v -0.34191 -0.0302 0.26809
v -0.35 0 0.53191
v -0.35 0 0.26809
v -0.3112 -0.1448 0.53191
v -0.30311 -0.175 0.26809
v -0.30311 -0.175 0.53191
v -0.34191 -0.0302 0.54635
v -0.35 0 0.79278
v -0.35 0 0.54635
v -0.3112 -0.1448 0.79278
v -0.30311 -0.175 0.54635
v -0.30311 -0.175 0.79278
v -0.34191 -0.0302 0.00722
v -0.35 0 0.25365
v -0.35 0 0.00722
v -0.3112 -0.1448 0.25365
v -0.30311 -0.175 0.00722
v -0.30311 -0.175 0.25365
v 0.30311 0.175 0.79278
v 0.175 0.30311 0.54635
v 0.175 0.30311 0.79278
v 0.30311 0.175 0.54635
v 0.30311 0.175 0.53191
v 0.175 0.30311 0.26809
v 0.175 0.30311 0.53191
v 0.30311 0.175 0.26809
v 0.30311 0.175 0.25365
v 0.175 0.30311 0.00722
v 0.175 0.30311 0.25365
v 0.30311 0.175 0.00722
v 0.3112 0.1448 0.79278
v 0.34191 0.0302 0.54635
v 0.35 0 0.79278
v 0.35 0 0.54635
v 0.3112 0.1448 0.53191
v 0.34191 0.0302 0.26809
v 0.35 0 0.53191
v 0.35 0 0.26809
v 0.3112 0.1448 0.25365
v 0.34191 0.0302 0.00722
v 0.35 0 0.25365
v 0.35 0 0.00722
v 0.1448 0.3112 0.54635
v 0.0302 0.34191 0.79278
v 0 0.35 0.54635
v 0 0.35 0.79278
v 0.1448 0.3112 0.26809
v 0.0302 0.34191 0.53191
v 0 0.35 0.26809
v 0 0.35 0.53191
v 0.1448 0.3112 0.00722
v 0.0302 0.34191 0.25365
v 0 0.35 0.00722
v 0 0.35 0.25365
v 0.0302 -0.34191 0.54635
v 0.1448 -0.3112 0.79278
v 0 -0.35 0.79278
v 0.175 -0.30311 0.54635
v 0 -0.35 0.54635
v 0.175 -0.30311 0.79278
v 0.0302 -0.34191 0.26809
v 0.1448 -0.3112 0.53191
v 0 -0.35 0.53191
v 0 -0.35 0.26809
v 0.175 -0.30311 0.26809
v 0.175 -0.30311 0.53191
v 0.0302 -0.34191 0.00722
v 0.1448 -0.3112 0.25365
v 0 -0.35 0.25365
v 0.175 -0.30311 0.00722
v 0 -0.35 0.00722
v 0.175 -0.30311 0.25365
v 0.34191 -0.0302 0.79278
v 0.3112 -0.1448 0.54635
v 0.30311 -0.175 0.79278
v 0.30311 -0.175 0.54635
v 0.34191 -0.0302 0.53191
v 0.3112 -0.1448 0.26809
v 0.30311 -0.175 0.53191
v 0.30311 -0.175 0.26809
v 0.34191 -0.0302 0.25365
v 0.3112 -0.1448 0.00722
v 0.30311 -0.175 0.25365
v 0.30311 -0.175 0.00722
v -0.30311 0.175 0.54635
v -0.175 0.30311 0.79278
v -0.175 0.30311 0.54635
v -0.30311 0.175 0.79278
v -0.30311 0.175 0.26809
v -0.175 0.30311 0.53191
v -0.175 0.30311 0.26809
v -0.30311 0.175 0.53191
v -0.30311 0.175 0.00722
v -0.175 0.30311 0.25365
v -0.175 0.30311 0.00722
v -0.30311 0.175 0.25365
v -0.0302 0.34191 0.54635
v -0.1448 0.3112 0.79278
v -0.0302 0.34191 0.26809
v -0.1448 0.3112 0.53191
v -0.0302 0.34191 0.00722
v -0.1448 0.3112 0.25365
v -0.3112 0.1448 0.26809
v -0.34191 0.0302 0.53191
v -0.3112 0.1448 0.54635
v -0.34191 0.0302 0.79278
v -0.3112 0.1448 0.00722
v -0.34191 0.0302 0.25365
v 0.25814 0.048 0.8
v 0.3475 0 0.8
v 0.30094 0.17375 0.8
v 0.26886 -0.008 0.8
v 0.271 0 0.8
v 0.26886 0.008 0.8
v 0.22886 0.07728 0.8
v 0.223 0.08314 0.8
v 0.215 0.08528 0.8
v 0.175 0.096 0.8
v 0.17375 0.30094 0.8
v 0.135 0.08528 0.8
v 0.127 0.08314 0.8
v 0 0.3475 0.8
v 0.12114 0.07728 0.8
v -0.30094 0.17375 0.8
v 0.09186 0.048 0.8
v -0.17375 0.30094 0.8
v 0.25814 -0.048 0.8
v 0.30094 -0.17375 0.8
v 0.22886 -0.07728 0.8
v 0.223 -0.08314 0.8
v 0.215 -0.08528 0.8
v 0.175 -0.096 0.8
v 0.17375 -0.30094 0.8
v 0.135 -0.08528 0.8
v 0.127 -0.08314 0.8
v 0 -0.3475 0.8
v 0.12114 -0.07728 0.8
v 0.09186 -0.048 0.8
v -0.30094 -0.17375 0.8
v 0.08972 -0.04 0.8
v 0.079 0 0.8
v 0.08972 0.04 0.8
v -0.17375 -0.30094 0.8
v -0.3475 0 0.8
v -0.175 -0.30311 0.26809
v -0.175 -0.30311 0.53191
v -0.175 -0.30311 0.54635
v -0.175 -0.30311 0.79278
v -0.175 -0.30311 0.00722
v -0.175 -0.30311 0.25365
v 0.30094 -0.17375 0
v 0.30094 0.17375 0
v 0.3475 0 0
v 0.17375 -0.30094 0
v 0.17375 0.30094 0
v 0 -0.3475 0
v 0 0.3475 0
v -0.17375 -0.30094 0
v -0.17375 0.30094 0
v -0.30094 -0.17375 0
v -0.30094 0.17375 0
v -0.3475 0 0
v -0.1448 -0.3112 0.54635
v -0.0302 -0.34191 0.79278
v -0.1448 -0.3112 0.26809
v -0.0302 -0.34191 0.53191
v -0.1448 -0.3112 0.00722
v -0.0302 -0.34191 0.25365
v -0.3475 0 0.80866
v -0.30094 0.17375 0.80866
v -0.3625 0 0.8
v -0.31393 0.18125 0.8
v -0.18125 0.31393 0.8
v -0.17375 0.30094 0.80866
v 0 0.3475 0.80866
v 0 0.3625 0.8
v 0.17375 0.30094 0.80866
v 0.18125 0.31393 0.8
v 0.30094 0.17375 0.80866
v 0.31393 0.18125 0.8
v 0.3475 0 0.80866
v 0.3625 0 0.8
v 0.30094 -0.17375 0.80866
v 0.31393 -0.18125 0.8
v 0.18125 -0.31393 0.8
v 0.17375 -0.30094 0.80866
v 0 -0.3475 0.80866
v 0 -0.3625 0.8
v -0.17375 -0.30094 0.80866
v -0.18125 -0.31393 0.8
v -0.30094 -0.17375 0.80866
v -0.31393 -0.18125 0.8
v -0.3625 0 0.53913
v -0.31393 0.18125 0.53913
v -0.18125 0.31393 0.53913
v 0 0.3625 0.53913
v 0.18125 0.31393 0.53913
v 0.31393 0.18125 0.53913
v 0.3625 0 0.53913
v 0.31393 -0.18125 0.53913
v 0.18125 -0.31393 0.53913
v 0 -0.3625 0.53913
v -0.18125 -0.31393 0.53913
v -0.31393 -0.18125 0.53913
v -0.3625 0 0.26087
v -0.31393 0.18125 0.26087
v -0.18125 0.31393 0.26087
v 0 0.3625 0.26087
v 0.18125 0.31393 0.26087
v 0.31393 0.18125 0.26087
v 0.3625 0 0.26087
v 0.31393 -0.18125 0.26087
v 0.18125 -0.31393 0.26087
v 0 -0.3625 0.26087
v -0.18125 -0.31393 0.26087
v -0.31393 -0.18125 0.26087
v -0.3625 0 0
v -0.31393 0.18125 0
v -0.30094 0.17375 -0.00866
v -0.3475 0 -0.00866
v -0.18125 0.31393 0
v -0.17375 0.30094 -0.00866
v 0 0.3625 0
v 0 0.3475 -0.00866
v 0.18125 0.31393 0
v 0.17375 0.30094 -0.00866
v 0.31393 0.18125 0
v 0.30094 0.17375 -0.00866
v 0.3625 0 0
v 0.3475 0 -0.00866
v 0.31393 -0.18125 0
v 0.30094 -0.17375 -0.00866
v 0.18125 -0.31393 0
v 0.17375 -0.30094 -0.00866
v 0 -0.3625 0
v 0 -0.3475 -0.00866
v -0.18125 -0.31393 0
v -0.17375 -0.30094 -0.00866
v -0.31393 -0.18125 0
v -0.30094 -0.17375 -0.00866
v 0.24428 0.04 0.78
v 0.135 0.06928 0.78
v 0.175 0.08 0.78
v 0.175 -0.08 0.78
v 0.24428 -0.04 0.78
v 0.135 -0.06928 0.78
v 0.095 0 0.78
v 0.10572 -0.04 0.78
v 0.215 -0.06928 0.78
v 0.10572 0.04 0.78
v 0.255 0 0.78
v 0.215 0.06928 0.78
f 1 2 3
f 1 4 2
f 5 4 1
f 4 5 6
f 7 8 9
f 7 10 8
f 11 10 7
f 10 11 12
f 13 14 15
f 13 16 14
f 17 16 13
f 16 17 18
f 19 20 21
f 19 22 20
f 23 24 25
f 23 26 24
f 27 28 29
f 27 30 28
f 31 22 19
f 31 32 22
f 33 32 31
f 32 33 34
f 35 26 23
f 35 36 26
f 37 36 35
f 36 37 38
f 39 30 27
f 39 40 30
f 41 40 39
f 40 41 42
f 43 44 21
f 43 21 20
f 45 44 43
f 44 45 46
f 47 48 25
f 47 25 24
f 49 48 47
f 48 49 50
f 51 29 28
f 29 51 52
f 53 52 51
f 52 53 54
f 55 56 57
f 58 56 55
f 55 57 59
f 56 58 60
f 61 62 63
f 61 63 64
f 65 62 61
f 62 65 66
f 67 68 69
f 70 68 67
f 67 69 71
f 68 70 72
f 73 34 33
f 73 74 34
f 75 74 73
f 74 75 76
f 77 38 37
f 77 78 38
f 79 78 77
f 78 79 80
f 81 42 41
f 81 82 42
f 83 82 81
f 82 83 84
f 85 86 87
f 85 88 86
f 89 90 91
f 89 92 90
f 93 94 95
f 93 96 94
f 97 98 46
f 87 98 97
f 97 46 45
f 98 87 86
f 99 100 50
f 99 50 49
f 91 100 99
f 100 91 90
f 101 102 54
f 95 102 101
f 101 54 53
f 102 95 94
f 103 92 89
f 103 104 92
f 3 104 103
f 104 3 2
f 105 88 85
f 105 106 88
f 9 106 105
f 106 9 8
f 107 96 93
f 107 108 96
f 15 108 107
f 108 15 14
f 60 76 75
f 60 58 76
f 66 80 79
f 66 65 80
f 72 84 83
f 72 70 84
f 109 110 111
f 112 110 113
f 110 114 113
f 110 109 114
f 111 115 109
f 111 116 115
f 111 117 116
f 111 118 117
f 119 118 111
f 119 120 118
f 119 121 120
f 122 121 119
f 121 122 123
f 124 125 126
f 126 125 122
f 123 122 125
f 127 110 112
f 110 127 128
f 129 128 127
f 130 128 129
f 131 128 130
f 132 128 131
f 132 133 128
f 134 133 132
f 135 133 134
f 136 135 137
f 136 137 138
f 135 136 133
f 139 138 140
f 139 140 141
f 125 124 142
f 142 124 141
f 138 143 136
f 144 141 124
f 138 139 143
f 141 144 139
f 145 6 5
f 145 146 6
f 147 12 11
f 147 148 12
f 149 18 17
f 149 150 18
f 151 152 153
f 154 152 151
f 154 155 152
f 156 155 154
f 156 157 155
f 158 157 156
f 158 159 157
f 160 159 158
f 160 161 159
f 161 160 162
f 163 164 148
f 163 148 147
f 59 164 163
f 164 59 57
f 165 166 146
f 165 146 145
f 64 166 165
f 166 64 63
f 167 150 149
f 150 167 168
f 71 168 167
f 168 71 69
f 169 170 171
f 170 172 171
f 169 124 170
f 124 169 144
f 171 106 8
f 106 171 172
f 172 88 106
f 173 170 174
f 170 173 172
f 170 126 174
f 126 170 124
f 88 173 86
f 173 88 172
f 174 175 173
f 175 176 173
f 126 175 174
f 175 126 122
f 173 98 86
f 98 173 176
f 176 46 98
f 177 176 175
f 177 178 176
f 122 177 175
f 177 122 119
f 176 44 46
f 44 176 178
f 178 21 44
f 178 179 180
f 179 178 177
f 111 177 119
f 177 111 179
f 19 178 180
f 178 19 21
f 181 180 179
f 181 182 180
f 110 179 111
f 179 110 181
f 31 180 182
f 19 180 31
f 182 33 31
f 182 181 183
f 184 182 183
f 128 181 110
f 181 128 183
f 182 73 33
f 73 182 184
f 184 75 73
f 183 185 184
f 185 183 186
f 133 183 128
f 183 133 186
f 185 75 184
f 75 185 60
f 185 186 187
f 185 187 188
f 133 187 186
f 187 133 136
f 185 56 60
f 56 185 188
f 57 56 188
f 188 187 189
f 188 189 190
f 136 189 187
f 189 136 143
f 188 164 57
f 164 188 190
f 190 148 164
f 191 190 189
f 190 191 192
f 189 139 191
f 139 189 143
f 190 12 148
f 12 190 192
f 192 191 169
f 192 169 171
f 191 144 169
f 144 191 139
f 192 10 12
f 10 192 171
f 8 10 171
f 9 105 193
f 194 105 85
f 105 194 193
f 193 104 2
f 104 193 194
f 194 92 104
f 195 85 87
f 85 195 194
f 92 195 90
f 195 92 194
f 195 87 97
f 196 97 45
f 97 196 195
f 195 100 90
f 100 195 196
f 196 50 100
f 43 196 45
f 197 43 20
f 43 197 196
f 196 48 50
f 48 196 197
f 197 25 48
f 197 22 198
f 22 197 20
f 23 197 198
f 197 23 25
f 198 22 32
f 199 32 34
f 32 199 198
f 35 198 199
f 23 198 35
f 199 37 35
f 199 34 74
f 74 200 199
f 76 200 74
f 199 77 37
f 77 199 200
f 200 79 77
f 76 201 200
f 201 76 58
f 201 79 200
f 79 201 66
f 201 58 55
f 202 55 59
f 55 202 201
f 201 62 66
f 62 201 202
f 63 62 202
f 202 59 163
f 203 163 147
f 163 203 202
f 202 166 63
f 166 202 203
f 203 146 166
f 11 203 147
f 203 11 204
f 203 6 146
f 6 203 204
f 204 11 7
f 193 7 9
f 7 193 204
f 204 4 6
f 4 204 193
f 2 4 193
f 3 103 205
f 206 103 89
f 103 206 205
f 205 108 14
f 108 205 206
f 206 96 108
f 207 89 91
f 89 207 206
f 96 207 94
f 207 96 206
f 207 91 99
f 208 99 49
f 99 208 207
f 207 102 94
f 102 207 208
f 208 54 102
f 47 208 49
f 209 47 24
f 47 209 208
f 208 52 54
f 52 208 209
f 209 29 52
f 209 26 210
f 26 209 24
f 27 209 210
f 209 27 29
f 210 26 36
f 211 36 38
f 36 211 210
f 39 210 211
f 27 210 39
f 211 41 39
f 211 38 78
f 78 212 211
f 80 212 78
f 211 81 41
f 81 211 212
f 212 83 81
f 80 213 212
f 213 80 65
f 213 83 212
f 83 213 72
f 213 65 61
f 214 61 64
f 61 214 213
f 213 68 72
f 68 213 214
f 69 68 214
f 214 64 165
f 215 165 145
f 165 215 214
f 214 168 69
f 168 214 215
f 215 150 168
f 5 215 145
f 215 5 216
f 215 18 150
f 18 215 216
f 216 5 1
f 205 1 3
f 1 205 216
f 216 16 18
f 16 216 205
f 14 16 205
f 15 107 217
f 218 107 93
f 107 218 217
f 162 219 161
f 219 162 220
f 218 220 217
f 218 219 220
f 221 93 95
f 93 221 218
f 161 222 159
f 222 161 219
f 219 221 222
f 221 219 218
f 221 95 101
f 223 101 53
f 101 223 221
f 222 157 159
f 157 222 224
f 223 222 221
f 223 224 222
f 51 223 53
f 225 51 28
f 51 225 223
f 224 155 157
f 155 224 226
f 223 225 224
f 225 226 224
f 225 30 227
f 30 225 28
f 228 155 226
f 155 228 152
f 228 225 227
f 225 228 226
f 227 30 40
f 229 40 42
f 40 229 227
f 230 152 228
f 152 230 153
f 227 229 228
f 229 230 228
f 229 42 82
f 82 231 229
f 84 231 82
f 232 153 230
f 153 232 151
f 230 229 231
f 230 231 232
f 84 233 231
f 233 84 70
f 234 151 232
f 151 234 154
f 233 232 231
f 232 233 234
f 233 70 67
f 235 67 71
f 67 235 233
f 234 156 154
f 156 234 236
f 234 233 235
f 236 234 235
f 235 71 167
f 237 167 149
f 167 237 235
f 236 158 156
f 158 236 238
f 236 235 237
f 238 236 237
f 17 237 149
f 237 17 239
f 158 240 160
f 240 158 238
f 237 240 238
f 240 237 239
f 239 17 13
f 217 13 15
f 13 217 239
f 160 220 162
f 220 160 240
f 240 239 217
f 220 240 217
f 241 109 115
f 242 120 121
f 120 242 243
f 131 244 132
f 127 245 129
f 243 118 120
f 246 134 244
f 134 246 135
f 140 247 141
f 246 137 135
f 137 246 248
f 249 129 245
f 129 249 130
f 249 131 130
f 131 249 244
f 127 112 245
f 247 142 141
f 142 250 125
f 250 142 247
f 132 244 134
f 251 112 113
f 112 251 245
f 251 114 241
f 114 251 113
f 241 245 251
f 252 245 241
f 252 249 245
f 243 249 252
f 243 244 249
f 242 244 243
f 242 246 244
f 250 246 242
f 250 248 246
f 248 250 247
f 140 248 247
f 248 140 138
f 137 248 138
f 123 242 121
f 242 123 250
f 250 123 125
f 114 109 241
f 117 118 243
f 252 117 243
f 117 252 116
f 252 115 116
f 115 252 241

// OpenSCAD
use <lib.scad>;

radius = 0.35;
height = 0.8;

module drumHD($fn=24) {
	module ring() {
		torus(0.01,radius-0.0075);
	}
	module cutOut() {
		translate([radius*0.5,0,height*0.5+0.03]) hull() {
			cyl(0.1,0.1,0.05);
			cyl(0.08,0.08,0.1);
		}
	}
	translate([0,0,height/2]) difference() {
		union() {
			cyl(radius,radius,height);
			translate([0,0,height/2]) ring();
			translate([0,0,height/5.75]) ring();
			translate([0,0,-height/5.75]) ring();
			translate([0,0,-height/2]) ring();
		}
		cutOut();
	}
}

module lidHD($fn=24) {
	translate([radius*0.5,0,height-0.01]) cyl(0.07,0.07,0.05);
}

module drumLD($fn=12) {
	module ring() {
		torus(0.01,radius-0.0075);
	}
	module cutOut() {
		translate([radius*0.5,0,height*0.5+0.03]) hull() {
			cyl(0.1,0.1,0.05);
			cyl(0.08,0.08,0.1);
		}
	}
	translate([0,0,height/2]) difference() {
		union() {
			cyl(radius,radius,height);
			translate([0,0,height/2]) ring();
			translate([0,0,height/5.75]) ring();
			translate([0,0,-height/5.75]) ring();
			translate([0,0,-height/2]) ring();
		}
		cutOut();
	}
}

module lidLD($fn=12) {
	translate([radius*0.5,0,height-0.01]) cyl(0.07,0.07,0.05);
}

//drumHD();
//lidHD();
drumLD();
//lidLD();
